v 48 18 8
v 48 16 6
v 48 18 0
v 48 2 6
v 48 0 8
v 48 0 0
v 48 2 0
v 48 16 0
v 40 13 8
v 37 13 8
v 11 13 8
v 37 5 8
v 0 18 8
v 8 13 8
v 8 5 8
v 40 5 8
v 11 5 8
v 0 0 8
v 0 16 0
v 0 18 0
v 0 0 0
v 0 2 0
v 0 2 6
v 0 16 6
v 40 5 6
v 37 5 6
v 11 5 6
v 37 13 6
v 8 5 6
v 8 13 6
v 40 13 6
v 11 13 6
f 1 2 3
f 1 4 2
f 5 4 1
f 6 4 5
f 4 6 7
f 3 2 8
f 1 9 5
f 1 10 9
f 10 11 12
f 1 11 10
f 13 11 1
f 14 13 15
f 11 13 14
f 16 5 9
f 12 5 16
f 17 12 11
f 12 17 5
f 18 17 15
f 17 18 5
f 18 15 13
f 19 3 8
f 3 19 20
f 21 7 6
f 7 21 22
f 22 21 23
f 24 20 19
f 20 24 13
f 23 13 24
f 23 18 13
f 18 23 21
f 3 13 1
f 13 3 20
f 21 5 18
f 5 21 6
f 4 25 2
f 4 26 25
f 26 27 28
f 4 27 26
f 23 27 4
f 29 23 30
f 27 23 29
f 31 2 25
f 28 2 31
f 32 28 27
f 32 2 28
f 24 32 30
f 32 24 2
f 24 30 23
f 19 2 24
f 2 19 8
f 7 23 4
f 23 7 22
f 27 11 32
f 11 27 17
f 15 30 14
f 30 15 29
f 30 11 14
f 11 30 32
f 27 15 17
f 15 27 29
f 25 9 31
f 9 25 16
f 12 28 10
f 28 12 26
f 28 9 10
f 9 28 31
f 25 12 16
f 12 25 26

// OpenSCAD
// Original MechIntel educational model. CC0-1.0. Units: mm.
// Not a standardized or load-rated component.
$fn=96;
length=48;
inner_width=14;
wall=2;
clear_height=6;
roof=2;
slot=3;
$fn=64;
difference(){
 union(){
  translate([0,0,0]) cube([length,inner_width+2*wall,clear_height+roof]);
 }
 translate([-1,wall,-1]) cube([length+2,inner_width,clear_height+1]);
 translate([8,wall+3,clear_height-1]) cube([slot,inner_width-6,roof+2]);
 translate([length-8-slot,wall+3,clear_height-1]) cube([slot,inner_width-6,roof+2]);
}
